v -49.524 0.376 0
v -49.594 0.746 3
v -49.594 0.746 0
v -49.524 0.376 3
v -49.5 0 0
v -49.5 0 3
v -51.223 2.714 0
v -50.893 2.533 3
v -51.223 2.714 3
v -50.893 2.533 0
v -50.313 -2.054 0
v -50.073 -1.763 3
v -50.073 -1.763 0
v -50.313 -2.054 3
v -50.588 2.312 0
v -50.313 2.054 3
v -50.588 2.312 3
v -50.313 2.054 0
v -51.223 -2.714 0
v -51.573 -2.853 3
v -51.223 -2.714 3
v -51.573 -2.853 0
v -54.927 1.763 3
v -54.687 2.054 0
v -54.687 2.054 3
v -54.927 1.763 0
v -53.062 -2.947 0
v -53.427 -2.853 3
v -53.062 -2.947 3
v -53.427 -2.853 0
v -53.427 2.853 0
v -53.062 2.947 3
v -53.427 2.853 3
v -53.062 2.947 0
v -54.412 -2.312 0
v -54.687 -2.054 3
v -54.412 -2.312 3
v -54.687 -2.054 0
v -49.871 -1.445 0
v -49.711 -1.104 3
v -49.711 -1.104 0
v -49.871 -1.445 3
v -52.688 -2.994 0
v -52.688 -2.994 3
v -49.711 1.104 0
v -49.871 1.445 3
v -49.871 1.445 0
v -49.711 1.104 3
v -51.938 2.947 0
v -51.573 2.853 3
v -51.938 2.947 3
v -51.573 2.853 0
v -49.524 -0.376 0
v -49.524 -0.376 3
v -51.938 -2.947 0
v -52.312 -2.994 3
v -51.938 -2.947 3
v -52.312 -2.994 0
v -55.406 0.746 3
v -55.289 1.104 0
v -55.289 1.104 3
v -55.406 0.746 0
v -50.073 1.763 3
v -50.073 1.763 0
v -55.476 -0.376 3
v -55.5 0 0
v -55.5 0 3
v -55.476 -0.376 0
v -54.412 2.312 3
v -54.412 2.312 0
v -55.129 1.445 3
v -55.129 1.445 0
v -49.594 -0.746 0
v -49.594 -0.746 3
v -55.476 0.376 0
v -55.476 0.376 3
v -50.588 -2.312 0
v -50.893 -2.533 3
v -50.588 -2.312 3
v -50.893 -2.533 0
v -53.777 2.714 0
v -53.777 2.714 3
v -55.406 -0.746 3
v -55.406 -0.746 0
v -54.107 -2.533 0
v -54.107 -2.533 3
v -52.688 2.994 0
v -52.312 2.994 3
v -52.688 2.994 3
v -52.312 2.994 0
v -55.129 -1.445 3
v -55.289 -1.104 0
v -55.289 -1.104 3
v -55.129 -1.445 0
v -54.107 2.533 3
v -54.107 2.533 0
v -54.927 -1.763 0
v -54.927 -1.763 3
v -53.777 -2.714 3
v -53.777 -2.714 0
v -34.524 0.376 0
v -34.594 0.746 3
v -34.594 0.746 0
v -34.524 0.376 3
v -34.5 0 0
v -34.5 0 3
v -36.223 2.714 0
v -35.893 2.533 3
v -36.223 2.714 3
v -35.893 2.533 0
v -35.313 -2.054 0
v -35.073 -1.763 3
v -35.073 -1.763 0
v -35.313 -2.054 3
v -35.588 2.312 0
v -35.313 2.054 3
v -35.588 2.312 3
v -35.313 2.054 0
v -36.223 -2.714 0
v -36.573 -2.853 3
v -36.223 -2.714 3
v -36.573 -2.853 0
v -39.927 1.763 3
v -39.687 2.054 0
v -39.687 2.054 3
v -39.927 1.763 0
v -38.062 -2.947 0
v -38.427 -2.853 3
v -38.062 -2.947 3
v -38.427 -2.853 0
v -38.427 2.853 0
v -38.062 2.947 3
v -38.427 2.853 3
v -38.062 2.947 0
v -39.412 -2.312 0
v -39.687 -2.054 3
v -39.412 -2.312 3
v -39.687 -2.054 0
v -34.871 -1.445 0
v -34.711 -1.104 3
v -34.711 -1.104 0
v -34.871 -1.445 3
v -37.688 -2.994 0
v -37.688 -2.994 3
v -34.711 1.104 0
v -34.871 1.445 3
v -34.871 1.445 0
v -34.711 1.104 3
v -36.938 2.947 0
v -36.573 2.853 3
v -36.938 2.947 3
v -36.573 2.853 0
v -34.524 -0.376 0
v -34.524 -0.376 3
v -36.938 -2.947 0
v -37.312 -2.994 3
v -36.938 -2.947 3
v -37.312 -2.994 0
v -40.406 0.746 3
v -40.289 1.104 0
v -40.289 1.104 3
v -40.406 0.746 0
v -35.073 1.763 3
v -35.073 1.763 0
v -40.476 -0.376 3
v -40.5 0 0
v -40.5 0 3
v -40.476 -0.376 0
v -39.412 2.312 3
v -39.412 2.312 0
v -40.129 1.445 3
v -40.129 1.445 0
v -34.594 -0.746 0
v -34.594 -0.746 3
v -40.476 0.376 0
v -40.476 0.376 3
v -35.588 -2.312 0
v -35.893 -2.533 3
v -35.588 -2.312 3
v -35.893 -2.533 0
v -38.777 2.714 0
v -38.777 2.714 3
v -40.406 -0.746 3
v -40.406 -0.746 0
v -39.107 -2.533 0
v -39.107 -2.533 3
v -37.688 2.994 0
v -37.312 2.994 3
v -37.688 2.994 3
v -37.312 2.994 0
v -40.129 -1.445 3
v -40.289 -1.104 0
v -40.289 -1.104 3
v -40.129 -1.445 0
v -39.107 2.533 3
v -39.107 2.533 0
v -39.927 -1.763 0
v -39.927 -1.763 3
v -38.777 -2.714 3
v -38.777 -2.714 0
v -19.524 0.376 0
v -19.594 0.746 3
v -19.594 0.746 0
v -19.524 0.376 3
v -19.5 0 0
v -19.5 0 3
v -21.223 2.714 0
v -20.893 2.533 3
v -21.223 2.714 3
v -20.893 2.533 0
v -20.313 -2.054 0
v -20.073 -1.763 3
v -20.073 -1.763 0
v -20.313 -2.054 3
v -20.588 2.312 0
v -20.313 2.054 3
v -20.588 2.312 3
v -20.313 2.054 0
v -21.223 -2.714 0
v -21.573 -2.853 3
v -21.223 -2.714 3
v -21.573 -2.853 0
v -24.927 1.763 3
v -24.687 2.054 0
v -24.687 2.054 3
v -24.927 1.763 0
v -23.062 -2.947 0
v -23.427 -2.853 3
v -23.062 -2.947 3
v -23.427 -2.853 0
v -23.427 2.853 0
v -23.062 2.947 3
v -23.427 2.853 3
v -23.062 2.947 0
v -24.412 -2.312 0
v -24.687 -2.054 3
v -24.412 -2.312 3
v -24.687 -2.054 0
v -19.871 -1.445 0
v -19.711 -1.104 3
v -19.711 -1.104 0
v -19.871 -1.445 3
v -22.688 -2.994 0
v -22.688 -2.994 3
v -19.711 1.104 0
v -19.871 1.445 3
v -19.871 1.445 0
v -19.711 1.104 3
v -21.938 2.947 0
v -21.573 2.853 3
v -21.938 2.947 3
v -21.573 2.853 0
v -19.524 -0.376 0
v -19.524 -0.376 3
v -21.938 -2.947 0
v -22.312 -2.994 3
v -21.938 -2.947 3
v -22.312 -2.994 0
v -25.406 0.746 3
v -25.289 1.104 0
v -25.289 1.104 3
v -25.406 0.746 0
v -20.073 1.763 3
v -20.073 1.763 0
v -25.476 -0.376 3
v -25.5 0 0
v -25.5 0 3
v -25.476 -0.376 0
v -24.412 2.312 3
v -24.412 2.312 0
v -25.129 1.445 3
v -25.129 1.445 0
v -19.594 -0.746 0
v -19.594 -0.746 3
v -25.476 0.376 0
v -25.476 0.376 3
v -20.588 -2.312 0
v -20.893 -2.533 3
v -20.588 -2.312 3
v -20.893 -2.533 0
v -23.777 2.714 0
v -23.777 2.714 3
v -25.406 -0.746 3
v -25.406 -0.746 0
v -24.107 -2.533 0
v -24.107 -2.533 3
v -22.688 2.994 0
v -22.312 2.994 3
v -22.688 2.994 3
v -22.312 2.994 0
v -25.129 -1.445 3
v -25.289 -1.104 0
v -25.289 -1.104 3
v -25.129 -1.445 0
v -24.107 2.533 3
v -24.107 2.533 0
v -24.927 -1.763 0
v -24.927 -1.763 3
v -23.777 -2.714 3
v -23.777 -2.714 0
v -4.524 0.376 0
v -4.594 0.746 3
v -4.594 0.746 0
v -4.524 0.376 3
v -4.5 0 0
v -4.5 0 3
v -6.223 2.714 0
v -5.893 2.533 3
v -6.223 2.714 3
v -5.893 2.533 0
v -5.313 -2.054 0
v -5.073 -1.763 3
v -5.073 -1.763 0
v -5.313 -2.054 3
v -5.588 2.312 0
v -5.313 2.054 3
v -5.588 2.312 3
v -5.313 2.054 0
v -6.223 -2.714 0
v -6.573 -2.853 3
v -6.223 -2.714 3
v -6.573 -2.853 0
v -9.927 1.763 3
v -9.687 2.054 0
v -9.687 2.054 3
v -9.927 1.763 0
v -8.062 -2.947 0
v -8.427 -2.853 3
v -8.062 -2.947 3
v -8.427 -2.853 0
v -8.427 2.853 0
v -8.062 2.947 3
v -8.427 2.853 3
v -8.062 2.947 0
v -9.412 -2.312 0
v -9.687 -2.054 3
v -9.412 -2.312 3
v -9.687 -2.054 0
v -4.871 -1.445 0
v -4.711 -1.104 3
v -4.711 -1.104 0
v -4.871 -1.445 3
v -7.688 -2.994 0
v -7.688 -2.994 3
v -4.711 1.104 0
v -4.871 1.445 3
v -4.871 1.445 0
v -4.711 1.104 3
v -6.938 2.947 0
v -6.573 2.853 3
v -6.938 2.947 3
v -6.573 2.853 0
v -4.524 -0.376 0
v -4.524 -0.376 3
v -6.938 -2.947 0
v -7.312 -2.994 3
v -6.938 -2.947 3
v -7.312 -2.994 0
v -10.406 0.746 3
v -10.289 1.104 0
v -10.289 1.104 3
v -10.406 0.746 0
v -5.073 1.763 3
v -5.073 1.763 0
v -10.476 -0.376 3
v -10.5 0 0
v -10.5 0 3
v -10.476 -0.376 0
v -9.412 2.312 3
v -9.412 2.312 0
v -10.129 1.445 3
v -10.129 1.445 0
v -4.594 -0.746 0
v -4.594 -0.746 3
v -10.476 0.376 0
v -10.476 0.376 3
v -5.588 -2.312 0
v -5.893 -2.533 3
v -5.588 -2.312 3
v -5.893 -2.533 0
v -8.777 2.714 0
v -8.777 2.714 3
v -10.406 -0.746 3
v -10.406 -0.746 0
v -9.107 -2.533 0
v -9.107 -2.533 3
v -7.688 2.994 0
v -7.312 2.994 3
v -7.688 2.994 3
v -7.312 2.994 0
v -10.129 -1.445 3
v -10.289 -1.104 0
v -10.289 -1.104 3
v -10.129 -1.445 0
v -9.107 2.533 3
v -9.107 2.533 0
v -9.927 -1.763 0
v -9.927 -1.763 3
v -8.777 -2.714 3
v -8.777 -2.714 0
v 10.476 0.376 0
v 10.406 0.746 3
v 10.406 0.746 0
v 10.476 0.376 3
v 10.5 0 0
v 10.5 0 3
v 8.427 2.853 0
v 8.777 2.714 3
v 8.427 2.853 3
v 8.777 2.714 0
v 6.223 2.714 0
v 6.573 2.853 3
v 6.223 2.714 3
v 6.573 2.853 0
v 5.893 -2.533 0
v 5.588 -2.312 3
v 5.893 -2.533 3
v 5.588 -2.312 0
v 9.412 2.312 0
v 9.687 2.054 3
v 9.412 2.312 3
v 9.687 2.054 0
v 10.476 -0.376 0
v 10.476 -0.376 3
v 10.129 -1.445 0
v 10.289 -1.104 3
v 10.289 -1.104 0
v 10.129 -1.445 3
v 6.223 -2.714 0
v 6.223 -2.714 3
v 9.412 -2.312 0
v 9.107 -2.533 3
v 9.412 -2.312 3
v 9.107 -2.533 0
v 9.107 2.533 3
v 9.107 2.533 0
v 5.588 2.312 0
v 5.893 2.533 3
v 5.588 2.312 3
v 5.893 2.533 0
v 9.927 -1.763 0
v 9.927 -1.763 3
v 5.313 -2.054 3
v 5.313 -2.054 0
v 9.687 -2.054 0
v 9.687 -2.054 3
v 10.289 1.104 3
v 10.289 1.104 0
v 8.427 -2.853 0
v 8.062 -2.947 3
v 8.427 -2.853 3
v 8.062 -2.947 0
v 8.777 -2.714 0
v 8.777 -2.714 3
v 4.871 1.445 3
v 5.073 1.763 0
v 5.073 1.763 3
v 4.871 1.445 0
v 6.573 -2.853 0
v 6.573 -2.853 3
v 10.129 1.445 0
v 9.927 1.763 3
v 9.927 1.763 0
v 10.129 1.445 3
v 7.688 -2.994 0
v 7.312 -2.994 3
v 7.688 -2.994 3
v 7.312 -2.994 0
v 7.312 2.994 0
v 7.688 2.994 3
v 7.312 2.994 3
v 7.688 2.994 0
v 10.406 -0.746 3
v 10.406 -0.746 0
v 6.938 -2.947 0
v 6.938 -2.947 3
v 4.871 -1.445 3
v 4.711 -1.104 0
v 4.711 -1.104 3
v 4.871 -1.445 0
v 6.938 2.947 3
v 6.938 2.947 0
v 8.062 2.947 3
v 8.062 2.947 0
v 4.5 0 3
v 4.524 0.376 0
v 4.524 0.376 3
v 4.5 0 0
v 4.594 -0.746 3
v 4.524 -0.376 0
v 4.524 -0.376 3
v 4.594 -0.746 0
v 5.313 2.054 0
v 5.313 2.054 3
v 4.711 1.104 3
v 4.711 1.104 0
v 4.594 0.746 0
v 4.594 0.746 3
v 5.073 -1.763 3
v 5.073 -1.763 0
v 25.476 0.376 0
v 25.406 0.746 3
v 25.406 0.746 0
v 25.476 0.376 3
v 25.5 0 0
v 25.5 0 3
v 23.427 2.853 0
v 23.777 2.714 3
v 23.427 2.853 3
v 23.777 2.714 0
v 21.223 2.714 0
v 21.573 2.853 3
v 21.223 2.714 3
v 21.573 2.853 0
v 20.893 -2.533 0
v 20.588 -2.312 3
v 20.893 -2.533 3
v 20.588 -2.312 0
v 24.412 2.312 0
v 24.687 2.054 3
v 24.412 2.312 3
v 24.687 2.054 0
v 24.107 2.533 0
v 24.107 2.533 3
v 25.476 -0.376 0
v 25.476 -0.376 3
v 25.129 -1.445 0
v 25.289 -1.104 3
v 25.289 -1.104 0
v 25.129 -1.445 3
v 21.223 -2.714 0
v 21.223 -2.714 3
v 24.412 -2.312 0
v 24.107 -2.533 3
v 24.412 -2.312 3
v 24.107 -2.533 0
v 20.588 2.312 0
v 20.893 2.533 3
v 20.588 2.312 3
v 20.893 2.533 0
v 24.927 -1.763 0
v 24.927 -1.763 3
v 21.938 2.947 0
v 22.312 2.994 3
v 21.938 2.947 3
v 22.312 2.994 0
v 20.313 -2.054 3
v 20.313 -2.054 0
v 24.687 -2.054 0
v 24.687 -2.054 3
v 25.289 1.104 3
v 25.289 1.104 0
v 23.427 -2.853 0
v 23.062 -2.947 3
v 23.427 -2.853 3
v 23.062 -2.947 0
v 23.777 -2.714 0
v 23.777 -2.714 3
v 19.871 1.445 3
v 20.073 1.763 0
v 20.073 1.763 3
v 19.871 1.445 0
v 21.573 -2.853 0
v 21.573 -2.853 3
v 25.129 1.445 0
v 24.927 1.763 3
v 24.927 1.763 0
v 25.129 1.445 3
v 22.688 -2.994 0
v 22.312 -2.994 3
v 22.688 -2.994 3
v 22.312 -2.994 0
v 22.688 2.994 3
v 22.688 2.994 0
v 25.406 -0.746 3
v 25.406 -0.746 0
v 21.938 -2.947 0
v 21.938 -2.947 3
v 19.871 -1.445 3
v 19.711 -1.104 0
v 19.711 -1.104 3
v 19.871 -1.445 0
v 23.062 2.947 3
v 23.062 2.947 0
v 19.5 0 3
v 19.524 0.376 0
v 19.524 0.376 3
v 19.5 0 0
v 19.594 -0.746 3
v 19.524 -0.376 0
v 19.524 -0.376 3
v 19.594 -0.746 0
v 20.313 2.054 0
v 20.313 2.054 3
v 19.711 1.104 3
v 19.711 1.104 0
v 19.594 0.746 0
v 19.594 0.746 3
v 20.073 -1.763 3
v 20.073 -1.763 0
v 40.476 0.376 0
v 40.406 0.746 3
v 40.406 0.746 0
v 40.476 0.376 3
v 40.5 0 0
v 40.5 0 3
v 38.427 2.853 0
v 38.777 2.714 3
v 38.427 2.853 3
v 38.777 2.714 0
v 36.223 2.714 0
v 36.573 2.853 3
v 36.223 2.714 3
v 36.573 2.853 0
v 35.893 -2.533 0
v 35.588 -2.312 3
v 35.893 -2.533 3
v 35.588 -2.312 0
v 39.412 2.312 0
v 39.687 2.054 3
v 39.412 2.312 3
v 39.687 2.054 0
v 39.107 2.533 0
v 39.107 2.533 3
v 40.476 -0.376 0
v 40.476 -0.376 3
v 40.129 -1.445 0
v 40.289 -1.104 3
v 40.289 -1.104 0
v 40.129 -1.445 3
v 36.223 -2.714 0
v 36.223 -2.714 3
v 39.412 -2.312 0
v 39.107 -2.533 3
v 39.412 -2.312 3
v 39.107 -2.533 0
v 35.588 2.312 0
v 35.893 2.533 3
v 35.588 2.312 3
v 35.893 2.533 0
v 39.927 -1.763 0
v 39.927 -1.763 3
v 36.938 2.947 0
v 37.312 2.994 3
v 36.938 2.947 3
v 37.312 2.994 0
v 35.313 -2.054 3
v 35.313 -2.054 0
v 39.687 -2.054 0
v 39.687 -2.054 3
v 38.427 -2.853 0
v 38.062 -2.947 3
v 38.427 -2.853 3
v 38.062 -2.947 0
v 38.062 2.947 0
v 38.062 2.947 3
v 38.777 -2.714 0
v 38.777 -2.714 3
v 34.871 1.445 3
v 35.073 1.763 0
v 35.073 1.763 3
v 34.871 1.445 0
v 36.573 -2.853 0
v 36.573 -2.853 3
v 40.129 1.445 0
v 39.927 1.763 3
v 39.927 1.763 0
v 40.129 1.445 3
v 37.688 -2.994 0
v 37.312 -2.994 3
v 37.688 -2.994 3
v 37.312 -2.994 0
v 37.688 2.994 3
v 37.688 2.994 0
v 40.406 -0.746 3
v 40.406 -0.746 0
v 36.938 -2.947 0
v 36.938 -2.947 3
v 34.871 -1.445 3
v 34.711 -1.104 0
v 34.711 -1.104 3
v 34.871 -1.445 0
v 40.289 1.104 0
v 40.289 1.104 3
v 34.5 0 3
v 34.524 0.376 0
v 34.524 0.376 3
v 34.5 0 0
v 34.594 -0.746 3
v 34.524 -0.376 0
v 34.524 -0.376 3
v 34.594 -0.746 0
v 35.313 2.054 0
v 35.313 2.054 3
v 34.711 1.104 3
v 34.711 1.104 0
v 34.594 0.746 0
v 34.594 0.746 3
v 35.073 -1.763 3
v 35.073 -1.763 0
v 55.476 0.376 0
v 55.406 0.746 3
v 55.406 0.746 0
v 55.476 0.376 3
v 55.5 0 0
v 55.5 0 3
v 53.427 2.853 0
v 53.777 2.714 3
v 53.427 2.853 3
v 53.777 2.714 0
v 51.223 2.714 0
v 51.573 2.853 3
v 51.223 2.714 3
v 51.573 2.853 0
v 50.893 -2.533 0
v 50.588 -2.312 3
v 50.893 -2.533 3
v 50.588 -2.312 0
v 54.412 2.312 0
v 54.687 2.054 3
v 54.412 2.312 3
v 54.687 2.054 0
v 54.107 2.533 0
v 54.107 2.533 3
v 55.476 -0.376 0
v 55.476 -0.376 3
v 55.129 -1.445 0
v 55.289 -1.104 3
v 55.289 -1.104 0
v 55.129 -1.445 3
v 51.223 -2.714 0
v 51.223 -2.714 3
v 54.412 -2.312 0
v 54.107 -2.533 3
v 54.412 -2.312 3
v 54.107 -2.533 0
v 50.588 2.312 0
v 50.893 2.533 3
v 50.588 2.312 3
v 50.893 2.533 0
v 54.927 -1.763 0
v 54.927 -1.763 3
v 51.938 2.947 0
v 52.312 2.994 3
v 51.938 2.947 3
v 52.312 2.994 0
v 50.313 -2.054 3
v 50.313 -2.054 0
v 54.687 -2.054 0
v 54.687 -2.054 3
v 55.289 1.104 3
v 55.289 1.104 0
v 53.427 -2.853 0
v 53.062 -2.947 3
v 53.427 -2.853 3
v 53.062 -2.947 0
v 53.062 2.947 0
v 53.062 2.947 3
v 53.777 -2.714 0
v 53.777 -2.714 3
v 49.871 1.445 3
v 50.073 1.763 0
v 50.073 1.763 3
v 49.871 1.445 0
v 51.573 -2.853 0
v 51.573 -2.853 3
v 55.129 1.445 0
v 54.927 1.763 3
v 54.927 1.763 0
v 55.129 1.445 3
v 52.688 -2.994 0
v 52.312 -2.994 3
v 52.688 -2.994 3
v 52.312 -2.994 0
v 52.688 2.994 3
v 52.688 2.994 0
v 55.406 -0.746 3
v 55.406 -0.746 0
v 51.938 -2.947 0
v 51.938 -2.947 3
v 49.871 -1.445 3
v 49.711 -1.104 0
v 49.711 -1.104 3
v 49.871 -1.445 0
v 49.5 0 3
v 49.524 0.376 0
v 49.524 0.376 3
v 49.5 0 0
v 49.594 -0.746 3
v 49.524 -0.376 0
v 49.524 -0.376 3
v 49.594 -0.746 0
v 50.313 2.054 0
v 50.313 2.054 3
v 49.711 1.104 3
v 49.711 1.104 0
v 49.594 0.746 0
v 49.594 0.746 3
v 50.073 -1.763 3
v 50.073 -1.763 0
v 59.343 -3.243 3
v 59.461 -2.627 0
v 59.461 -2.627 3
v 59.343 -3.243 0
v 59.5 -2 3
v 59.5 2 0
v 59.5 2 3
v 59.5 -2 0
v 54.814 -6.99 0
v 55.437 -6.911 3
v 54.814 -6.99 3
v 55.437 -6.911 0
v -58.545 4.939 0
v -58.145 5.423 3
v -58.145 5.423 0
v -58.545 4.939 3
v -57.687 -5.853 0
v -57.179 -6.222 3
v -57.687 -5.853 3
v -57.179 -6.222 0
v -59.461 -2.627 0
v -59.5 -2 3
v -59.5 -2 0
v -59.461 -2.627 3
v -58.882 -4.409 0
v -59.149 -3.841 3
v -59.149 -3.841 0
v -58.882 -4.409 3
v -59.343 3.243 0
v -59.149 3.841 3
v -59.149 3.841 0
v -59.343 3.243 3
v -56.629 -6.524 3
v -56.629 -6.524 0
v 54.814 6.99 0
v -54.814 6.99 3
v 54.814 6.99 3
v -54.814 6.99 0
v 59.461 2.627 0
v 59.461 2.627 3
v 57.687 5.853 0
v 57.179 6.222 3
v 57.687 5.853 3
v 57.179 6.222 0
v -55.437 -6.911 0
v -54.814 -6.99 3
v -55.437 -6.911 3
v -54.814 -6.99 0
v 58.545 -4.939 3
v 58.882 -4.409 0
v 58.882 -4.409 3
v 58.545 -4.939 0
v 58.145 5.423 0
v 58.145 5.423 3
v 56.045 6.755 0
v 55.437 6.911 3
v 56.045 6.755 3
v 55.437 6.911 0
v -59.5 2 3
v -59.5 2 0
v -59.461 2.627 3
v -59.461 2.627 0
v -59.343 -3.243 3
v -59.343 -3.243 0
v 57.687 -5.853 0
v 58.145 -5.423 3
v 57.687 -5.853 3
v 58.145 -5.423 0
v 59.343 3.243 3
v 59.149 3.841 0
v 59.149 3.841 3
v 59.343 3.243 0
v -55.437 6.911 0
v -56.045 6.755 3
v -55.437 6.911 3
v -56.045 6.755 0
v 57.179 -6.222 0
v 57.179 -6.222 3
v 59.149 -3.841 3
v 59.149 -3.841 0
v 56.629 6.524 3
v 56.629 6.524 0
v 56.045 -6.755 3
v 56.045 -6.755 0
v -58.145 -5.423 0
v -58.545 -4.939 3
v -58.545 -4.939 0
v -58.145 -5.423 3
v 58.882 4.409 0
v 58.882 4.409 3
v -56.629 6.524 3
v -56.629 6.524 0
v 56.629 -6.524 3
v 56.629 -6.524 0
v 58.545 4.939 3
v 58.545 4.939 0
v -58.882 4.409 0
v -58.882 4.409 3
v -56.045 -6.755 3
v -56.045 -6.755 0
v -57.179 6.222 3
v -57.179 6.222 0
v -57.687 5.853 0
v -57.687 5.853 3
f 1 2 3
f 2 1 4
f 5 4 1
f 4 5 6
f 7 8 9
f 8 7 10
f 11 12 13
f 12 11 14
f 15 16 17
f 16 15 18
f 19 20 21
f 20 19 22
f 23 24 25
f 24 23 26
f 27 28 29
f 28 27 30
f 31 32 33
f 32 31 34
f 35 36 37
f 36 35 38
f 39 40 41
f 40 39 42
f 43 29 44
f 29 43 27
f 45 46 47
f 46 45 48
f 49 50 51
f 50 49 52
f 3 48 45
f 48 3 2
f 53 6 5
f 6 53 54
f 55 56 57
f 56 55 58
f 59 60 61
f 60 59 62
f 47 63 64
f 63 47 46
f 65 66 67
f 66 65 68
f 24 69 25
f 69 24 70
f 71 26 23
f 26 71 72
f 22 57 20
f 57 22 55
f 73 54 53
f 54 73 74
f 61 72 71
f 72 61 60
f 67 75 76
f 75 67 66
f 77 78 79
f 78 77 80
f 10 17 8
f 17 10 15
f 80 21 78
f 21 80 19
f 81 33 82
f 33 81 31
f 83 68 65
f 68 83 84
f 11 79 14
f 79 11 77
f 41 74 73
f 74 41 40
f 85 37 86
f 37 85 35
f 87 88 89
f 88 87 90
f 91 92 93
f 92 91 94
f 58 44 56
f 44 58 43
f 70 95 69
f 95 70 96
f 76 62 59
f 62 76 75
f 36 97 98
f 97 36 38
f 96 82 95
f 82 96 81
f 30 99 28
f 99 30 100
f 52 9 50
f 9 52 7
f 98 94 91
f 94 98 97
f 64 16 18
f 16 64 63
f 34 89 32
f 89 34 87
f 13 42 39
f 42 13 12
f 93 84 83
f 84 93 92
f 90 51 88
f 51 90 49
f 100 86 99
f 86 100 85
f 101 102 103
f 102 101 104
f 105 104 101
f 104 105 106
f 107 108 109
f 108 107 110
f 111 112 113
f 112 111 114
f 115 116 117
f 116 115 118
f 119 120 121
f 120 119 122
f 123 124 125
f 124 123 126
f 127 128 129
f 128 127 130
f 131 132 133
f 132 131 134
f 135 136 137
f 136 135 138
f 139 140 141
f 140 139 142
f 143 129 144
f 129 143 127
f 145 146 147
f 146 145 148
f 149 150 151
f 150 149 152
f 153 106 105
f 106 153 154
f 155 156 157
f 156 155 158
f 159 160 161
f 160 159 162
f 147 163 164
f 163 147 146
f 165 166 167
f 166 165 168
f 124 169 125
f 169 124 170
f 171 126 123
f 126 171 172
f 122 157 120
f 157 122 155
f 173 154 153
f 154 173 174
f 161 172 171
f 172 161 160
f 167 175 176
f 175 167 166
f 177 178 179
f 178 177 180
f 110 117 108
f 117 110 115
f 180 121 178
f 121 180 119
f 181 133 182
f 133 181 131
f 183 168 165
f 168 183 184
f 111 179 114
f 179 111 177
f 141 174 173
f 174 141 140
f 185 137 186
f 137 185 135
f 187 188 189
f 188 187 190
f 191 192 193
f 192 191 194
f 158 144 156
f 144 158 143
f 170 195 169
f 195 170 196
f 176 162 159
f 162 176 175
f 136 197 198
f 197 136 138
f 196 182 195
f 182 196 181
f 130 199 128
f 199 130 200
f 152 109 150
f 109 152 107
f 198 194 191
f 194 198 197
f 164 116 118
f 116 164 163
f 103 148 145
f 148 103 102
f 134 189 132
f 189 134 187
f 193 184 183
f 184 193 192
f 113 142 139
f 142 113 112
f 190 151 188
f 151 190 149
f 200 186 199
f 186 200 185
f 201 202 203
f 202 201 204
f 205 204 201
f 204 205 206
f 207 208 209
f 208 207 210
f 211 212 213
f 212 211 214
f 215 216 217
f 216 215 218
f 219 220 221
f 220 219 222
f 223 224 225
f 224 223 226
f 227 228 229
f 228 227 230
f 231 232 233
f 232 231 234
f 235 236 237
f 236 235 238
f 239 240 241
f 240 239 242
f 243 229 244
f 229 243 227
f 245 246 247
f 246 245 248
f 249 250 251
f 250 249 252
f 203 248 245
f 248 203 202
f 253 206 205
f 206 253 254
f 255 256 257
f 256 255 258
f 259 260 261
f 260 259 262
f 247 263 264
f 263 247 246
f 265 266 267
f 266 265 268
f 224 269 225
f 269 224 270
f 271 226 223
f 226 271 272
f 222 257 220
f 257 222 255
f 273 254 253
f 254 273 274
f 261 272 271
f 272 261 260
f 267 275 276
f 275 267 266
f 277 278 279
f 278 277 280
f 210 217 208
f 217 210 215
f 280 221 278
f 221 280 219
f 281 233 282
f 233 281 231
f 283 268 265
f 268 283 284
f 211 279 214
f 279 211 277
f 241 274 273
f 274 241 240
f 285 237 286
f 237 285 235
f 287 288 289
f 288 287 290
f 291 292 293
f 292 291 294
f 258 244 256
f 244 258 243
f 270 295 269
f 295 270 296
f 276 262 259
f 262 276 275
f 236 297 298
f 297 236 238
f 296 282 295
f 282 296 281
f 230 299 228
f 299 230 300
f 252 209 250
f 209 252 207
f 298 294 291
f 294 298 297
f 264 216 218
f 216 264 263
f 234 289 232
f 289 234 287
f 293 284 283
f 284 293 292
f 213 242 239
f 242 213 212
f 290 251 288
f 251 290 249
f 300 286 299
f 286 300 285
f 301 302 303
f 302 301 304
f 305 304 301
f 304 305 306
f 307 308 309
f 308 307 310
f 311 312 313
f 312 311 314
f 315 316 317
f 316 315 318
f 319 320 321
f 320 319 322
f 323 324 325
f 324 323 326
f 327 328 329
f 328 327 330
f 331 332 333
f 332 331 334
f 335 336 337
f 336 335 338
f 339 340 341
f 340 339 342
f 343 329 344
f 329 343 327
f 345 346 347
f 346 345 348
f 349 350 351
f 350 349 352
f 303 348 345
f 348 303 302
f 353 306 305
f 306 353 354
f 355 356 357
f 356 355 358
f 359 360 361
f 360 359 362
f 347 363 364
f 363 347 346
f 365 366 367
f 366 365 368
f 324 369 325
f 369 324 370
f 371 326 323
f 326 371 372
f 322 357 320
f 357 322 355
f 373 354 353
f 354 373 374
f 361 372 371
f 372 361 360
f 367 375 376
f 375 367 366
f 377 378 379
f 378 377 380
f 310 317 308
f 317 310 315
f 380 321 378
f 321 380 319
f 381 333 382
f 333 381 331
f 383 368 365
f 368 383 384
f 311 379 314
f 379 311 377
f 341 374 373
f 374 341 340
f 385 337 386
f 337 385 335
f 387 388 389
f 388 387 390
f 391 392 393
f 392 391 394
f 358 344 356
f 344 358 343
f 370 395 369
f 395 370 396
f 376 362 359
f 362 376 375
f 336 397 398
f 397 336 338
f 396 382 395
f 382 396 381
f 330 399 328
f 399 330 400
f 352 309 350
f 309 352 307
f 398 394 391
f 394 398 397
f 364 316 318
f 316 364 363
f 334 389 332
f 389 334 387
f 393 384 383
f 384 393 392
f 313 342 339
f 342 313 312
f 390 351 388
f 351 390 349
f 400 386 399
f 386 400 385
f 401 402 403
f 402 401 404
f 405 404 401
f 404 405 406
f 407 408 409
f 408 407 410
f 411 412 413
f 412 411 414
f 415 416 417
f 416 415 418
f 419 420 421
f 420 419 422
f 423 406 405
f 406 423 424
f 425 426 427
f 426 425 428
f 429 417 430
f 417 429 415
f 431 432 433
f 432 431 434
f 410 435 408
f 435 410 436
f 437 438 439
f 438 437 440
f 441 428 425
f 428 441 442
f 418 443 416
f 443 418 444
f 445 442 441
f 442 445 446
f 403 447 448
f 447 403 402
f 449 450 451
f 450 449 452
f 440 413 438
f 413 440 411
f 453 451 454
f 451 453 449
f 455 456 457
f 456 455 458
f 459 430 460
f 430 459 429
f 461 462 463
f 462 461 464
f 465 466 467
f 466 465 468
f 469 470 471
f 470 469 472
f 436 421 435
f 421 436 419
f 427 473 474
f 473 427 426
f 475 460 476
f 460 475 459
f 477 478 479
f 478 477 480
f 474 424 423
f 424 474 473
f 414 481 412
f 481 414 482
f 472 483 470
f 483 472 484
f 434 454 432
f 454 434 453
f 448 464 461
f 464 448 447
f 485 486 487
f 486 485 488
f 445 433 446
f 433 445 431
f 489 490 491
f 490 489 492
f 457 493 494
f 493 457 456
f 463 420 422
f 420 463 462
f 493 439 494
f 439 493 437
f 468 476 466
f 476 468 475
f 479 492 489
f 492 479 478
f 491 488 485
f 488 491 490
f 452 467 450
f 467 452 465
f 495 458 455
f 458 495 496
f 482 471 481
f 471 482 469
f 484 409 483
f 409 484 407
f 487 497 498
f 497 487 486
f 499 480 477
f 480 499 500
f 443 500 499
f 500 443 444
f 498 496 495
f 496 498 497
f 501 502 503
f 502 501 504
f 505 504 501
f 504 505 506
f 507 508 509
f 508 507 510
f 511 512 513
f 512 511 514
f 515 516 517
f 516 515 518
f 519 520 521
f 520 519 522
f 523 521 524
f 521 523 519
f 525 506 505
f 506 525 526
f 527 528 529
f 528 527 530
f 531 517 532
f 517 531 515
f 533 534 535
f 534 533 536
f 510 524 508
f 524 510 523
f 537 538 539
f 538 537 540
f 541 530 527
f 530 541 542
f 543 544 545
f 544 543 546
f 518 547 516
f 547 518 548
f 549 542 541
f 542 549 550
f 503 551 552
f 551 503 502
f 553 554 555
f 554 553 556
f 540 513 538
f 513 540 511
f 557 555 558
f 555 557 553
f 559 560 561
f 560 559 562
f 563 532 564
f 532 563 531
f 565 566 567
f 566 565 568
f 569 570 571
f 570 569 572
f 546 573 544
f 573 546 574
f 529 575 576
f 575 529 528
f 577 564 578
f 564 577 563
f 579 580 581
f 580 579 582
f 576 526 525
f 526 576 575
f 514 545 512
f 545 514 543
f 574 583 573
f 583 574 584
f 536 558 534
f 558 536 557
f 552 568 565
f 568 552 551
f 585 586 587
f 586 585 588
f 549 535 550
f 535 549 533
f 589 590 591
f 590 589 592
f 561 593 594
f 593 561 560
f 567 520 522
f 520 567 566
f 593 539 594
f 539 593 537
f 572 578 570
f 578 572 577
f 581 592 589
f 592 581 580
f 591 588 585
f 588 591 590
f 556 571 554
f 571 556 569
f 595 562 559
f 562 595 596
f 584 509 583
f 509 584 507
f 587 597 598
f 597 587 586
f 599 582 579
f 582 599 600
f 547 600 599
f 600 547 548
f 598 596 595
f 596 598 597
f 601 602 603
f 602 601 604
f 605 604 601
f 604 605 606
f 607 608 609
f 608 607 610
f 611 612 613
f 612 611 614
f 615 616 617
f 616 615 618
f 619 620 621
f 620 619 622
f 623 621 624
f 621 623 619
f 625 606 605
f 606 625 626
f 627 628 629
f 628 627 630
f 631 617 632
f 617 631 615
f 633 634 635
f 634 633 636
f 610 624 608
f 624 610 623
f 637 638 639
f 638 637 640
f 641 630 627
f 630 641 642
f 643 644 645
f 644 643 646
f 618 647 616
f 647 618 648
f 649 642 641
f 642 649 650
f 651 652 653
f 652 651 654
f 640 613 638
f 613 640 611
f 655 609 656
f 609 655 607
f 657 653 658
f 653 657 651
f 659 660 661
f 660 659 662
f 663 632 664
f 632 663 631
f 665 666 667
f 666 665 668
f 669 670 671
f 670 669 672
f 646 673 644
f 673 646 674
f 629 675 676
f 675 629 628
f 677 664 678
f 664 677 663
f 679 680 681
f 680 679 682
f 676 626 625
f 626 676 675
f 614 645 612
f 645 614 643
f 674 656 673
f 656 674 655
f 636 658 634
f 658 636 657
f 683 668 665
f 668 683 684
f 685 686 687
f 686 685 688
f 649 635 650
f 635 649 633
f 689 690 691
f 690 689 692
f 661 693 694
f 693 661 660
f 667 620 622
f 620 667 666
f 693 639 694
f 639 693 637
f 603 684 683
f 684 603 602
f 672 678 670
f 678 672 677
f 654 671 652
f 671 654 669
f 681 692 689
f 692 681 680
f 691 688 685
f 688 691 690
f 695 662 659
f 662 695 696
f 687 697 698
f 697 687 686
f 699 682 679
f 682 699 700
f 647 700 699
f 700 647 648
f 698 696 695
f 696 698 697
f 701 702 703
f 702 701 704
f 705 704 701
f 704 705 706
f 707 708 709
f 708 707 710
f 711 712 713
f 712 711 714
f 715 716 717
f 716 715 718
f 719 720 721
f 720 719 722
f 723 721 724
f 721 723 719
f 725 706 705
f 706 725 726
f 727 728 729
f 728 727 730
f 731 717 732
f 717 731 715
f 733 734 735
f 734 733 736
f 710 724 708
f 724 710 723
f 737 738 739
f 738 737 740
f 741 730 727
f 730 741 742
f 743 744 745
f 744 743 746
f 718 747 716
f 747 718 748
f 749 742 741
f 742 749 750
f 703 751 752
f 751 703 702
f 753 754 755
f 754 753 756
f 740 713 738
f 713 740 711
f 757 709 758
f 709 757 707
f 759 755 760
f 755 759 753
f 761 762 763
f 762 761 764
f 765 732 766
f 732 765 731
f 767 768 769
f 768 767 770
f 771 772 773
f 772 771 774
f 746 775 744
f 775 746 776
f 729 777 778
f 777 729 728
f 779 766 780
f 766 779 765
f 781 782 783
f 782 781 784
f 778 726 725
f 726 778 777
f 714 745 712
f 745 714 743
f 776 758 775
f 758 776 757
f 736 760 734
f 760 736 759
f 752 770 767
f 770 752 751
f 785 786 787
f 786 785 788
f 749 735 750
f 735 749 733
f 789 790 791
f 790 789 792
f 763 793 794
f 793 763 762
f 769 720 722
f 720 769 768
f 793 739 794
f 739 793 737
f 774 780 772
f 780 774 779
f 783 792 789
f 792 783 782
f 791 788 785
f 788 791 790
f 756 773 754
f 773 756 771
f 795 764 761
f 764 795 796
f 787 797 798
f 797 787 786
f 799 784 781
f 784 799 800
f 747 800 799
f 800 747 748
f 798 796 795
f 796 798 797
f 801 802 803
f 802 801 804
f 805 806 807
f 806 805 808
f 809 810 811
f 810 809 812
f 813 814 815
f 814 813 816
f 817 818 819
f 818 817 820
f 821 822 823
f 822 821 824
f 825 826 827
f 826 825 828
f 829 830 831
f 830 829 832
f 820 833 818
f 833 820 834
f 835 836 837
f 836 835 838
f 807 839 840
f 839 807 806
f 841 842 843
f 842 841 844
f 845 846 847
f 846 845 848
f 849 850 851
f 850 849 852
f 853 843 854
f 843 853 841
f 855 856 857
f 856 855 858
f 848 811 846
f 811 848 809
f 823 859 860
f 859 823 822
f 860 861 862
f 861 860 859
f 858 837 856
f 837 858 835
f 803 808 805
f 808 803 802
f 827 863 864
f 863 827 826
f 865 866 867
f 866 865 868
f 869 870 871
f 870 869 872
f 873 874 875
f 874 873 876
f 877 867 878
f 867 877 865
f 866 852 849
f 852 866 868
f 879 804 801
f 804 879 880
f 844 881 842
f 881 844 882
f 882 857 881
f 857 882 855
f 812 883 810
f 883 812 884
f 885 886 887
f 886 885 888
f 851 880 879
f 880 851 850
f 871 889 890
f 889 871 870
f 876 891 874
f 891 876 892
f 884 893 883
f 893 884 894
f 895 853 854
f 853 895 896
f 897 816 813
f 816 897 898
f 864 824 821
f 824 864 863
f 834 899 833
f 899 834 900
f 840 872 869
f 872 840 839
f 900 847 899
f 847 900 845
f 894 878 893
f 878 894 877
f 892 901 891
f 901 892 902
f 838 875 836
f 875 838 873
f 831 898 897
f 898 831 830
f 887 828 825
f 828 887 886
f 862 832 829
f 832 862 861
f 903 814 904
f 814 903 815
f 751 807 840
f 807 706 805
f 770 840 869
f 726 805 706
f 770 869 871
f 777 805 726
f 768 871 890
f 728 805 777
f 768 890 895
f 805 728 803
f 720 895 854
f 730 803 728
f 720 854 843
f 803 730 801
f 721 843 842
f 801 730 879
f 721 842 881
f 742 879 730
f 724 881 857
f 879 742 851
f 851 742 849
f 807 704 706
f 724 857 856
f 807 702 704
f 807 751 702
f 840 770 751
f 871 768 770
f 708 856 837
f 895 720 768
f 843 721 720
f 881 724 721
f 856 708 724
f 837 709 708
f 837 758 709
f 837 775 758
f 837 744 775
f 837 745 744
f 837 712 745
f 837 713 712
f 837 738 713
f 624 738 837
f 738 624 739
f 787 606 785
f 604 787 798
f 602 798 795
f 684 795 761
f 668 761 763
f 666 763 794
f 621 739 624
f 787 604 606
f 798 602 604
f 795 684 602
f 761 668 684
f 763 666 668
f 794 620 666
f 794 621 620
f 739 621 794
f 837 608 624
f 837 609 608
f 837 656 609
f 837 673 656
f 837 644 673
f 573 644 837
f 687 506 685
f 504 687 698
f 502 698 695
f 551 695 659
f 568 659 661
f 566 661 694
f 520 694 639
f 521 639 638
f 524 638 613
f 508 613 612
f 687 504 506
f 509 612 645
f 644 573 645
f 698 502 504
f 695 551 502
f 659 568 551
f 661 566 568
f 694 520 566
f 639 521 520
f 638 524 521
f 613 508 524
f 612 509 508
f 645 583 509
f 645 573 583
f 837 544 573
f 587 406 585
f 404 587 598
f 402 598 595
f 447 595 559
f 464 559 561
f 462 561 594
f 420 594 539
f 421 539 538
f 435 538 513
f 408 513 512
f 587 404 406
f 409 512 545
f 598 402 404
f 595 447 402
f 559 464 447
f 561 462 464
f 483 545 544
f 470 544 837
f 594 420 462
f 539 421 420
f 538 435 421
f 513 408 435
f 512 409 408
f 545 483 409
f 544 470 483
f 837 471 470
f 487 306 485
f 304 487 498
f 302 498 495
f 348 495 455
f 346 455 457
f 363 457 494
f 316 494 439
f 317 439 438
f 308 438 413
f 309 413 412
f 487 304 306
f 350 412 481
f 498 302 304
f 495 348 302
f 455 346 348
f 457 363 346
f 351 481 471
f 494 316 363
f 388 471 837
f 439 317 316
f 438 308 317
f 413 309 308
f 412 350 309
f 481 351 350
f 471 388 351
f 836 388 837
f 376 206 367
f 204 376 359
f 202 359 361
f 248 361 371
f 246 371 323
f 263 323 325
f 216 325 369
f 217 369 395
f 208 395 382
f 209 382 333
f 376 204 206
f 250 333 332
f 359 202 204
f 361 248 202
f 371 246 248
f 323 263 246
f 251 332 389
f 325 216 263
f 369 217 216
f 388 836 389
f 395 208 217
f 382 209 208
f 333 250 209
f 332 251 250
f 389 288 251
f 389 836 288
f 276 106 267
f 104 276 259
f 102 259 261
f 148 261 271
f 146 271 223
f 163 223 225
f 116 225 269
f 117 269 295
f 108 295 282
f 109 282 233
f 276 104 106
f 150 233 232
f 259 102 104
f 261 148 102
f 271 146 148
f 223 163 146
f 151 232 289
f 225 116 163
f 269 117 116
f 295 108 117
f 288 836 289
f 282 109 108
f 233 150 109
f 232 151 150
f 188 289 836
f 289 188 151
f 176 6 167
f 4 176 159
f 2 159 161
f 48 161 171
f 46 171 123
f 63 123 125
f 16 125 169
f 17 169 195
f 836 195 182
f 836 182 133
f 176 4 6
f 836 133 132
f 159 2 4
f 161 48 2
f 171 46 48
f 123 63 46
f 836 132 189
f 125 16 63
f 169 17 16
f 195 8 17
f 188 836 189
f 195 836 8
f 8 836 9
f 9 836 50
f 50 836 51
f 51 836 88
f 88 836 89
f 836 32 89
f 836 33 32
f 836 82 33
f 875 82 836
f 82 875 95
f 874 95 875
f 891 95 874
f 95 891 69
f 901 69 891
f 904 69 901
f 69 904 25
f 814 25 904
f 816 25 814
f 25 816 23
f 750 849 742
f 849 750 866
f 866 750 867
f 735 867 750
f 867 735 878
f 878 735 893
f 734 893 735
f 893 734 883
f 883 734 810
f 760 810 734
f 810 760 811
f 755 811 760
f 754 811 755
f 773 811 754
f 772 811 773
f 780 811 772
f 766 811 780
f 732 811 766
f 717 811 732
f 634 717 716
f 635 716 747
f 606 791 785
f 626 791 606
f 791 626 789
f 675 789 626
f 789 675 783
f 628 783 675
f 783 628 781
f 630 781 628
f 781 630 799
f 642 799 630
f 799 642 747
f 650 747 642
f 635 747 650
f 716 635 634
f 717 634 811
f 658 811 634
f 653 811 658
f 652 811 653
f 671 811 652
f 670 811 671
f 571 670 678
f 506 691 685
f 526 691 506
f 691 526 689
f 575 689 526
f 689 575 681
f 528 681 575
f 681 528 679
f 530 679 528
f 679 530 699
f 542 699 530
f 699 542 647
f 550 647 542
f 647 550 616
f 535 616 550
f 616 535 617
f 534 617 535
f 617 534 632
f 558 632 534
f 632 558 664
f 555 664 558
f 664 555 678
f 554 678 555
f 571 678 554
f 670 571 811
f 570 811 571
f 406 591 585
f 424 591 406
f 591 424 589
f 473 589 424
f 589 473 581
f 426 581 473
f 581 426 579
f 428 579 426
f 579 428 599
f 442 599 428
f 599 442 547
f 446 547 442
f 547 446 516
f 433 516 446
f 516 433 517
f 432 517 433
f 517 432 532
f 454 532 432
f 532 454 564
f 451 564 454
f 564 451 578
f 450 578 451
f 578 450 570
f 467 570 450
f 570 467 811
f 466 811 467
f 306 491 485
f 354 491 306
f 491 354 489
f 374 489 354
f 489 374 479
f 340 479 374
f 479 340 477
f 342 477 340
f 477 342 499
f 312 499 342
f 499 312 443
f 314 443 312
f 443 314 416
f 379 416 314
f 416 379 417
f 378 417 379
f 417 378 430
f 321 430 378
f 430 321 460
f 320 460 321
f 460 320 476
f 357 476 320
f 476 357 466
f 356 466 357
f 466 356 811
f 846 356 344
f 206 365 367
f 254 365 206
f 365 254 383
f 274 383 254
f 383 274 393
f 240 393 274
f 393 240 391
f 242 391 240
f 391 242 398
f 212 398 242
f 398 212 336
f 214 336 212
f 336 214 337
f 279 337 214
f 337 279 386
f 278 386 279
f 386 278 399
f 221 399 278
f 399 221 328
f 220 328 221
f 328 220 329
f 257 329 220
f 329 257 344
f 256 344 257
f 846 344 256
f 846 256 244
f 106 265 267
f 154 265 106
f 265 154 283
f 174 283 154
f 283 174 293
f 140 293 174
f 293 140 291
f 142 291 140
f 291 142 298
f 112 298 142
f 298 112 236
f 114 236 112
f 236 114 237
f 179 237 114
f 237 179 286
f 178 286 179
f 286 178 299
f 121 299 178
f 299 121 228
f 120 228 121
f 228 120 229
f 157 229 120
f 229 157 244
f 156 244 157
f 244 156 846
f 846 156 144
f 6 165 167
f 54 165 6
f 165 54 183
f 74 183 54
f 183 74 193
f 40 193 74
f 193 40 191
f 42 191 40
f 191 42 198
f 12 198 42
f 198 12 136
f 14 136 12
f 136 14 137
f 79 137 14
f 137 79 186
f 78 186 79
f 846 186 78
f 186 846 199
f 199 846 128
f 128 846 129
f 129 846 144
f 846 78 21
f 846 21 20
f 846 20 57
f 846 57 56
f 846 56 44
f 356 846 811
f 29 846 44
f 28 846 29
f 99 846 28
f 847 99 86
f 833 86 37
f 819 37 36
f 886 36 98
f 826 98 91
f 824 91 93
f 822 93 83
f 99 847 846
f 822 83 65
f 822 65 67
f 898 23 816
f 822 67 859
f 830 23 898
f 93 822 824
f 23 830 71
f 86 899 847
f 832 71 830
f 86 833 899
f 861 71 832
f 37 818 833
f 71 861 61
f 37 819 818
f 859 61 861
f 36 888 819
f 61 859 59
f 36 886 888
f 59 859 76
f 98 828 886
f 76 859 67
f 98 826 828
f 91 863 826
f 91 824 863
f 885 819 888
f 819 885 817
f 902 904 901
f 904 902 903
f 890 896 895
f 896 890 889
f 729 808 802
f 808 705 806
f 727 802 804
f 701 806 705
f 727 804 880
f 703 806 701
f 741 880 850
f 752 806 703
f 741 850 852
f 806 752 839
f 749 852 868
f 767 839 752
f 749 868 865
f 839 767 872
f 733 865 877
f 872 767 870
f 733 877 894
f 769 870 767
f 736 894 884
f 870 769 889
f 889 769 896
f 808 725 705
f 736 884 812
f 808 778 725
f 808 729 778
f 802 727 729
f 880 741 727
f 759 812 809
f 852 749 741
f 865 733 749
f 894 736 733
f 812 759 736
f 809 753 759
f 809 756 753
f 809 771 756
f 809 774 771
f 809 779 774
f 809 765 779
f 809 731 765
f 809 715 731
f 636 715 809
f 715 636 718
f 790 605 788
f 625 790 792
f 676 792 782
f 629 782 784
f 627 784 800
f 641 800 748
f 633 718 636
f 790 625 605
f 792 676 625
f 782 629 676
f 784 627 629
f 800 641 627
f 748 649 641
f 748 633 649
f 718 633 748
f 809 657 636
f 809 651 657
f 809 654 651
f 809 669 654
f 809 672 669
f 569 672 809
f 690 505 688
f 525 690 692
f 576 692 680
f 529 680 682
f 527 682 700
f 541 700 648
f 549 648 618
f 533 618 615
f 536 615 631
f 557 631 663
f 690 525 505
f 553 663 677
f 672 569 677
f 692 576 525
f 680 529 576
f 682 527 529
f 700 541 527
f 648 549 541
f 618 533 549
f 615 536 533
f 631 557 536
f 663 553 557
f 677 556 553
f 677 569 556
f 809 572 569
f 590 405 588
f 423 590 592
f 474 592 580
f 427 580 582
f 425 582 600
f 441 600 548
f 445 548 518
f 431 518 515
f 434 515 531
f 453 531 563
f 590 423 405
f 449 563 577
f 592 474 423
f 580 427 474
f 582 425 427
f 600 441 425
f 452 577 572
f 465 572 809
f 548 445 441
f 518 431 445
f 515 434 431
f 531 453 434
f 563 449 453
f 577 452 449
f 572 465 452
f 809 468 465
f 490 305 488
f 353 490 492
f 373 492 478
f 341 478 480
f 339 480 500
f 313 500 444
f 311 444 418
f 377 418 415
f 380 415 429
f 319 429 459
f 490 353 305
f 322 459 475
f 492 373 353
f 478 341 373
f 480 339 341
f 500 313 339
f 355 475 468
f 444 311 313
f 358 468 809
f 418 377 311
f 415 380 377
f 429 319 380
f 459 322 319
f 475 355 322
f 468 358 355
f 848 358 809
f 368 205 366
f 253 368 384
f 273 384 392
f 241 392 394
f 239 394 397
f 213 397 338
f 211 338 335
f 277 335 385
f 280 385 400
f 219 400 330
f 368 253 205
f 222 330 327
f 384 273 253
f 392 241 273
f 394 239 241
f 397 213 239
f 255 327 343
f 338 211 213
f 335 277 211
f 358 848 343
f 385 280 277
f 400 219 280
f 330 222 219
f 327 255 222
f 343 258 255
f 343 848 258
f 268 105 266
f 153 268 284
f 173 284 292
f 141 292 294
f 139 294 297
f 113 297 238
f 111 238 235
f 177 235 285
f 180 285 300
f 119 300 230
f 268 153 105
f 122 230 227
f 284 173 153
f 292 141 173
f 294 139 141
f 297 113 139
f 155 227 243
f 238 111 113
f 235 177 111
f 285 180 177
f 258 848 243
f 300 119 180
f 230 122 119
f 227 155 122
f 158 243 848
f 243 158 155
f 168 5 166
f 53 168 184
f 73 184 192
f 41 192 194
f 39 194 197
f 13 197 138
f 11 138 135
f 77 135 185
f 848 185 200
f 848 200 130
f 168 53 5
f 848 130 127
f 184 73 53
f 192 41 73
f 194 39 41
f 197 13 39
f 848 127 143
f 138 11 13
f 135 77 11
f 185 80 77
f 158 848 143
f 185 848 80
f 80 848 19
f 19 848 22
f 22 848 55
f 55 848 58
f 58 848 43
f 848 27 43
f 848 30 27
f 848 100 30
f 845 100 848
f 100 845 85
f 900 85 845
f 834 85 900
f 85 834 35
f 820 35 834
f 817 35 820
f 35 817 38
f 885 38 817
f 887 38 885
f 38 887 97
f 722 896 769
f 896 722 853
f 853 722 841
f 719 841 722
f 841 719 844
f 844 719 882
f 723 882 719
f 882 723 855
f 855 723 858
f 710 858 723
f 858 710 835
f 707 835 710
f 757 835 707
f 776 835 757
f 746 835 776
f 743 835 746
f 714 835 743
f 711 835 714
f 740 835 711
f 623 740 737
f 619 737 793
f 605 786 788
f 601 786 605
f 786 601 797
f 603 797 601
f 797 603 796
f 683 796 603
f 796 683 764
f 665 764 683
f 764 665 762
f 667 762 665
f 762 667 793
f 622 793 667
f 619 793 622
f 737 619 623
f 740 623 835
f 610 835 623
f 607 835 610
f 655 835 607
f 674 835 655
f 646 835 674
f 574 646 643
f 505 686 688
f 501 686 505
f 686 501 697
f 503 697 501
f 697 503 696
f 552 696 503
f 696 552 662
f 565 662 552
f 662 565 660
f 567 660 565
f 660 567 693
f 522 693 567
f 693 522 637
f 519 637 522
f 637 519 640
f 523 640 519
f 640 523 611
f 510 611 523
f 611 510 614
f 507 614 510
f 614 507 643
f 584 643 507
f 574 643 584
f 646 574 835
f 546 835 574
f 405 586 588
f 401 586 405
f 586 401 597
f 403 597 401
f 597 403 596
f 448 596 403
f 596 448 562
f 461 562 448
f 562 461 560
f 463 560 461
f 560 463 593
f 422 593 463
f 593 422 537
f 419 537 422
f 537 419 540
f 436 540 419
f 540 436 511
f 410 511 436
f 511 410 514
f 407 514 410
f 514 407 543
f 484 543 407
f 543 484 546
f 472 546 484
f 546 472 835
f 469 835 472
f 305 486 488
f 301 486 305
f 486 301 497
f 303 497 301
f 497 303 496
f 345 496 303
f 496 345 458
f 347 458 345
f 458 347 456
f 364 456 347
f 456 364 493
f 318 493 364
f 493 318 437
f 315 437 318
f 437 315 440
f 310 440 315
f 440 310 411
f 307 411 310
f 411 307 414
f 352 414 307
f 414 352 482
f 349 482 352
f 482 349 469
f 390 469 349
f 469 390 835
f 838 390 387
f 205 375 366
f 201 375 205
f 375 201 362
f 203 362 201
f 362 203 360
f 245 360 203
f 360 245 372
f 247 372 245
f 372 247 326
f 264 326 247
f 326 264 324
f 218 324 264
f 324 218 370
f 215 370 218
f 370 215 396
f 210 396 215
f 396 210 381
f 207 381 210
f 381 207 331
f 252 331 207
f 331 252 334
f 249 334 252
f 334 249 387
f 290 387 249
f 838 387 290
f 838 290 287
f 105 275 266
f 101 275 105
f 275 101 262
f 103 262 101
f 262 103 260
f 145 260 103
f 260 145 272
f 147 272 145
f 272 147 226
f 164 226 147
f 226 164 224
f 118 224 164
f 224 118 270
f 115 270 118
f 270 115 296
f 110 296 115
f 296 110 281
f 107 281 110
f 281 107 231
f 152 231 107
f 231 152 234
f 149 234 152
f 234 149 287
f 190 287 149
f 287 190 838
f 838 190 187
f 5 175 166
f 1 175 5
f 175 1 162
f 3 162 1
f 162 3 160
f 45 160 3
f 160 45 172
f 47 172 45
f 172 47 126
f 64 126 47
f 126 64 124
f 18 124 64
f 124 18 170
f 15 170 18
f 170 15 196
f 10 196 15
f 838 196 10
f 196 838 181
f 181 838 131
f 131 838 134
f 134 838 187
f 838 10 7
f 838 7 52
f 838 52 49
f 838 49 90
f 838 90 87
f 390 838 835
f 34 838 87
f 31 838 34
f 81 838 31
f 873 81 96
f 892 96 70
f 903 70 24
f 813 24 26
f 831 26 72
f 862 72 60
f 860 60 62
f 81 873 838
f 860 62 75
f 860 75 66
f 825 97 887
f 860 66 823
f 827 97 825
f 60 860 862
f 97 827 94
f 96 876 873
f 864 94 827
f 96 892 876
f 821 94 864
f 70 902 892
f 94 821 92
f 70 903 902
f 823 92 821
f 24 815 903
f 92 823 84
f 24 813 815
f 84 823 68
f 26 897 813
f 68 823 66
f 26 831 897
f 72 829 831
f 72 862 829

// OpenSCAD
$fn = 50;


difference() {
	union() {
		translate(v = [0, 0, 0]) {
			rotate(a = [0, 0, 0]) {
				hull() {
					translate(v = [-54.5000000000, 2.0000000000, 0]) {
						rotate(a = [0, 0, 0]) {
							translate(v = [0, 0, 0]) {
								rotate(a = [0, 0, 0]) {
									cylinder(h = 3, r = 5);
								}
							}
						}
					}
					translate(v = [54.5000000000, 2.0000000000, 0]) {
						rotate(a = [0, 0, 0]) {
							translate(v = [0, 0, 0]) {
								rotate(a = [0, 0, 0]) {
									cylinder(h = 3, r = 5);
								}
							}
						}
					}
					translate(v = [-54.5000000000, -2.0000000000, 0]) {
						rotate(a = [0, 0, 0]) {
							translate(v = [0, 0, 0]) {
								rotate(a = [0, 0, 0]) {
									cylinder(h = 3, r = 5);
								}
							}
						}
					}
					translate(v = [54.5000000000, -2.0000000000, 0]) {
						rotate(a = [0, 0, 0]) {
							translate(v = [0, 0, 0]) {
								rotate(a = [0, 0, 0]) {
									cylinder(h = 3, r = 5);
								}
							}
						}
					}
				}
			}
		}
	}
	union() {
		translate(v = [-52.5000000000, 0.0000000000, 0]) {
			rotate(a = [0, 0, 0]) {
				translate(v = [0, 0, -50]) {
					rotate(a = [0, 0, 0]) {
						cylinder(h = 100, r = 3.0000000000);
					}
				}
			}
		}
		translate(v = [-37.5000000000, 0.0000000000, 0]) {
			rotate(a = [0, 0, 0]) {
				translate(v = [0, 0, -50]) {
					rotate(a = [0, 0, 0]) {
						cylinder(h = 100, r = 3.0000000000);
					}
				}
			}
		}
		translate(v = [-22.5000000000, 0.0000000000, 0]) {
			rotate(a = [0, 0, 0]) {
				translate(v = [0, 0, -50]) {
					rotate(a = [0, 0, 0]) {
						cylinder(h = 100, r = 3.0000000000);
					}
				}
			}
		}
		translate(v = [-7.5000000000, 0.0000000000, 0]) {
			rotate(a = [0, 0, 0]) {
				translate(v = [0, 0, -50]) {
					rotate(a = [0, 0, 0]) {
						cylinder(h = 100, r = 3.0000000000);
					}
				}
			}
		}
		translate(v = [7.5000000000, 0.0000000000, 0]) {
			rotate(a = [0, 0, 0]) {
				translate(v = [0, 0, -50]) {
					rotate(a = [0, 0, 0]) {
						cylinder(h = 100, r = 3.0000000000);
					}
				}
			}
		}
		translate(v = [22.5000000000, 0.0000000000, 0]) {
			rotate(a = [0, 0, 0]) {
				translate(v = [0, 0, -50]) {
					rotate(a = [0, 0, 0]) {
						cylinder(h = 100, r = 3.0000000000);
					}
				}
			}
		}
		translate(v = [37.5000000000, 0.0000000000, 0]) {
			rotate(a = [0, 0, 0]) {
				translate(v = [0, 0, -50]) {
					rotate(a = [0, 0, 0]) {
						cylinder(h = 100, r = 3.0000000000);
					}
				}
			}
		}
		translate(v = [52.5000000000, 0.0000000000, 0]) {
			rotate(a = [0, 0, 0]) {
				translate(v = [0, 0, -50]) {
					rotate(a = [0, 0, 0]) {
						cylinder(h = 100, r = 3.0000000000);
					}
				}
			}
		}
	}
}
